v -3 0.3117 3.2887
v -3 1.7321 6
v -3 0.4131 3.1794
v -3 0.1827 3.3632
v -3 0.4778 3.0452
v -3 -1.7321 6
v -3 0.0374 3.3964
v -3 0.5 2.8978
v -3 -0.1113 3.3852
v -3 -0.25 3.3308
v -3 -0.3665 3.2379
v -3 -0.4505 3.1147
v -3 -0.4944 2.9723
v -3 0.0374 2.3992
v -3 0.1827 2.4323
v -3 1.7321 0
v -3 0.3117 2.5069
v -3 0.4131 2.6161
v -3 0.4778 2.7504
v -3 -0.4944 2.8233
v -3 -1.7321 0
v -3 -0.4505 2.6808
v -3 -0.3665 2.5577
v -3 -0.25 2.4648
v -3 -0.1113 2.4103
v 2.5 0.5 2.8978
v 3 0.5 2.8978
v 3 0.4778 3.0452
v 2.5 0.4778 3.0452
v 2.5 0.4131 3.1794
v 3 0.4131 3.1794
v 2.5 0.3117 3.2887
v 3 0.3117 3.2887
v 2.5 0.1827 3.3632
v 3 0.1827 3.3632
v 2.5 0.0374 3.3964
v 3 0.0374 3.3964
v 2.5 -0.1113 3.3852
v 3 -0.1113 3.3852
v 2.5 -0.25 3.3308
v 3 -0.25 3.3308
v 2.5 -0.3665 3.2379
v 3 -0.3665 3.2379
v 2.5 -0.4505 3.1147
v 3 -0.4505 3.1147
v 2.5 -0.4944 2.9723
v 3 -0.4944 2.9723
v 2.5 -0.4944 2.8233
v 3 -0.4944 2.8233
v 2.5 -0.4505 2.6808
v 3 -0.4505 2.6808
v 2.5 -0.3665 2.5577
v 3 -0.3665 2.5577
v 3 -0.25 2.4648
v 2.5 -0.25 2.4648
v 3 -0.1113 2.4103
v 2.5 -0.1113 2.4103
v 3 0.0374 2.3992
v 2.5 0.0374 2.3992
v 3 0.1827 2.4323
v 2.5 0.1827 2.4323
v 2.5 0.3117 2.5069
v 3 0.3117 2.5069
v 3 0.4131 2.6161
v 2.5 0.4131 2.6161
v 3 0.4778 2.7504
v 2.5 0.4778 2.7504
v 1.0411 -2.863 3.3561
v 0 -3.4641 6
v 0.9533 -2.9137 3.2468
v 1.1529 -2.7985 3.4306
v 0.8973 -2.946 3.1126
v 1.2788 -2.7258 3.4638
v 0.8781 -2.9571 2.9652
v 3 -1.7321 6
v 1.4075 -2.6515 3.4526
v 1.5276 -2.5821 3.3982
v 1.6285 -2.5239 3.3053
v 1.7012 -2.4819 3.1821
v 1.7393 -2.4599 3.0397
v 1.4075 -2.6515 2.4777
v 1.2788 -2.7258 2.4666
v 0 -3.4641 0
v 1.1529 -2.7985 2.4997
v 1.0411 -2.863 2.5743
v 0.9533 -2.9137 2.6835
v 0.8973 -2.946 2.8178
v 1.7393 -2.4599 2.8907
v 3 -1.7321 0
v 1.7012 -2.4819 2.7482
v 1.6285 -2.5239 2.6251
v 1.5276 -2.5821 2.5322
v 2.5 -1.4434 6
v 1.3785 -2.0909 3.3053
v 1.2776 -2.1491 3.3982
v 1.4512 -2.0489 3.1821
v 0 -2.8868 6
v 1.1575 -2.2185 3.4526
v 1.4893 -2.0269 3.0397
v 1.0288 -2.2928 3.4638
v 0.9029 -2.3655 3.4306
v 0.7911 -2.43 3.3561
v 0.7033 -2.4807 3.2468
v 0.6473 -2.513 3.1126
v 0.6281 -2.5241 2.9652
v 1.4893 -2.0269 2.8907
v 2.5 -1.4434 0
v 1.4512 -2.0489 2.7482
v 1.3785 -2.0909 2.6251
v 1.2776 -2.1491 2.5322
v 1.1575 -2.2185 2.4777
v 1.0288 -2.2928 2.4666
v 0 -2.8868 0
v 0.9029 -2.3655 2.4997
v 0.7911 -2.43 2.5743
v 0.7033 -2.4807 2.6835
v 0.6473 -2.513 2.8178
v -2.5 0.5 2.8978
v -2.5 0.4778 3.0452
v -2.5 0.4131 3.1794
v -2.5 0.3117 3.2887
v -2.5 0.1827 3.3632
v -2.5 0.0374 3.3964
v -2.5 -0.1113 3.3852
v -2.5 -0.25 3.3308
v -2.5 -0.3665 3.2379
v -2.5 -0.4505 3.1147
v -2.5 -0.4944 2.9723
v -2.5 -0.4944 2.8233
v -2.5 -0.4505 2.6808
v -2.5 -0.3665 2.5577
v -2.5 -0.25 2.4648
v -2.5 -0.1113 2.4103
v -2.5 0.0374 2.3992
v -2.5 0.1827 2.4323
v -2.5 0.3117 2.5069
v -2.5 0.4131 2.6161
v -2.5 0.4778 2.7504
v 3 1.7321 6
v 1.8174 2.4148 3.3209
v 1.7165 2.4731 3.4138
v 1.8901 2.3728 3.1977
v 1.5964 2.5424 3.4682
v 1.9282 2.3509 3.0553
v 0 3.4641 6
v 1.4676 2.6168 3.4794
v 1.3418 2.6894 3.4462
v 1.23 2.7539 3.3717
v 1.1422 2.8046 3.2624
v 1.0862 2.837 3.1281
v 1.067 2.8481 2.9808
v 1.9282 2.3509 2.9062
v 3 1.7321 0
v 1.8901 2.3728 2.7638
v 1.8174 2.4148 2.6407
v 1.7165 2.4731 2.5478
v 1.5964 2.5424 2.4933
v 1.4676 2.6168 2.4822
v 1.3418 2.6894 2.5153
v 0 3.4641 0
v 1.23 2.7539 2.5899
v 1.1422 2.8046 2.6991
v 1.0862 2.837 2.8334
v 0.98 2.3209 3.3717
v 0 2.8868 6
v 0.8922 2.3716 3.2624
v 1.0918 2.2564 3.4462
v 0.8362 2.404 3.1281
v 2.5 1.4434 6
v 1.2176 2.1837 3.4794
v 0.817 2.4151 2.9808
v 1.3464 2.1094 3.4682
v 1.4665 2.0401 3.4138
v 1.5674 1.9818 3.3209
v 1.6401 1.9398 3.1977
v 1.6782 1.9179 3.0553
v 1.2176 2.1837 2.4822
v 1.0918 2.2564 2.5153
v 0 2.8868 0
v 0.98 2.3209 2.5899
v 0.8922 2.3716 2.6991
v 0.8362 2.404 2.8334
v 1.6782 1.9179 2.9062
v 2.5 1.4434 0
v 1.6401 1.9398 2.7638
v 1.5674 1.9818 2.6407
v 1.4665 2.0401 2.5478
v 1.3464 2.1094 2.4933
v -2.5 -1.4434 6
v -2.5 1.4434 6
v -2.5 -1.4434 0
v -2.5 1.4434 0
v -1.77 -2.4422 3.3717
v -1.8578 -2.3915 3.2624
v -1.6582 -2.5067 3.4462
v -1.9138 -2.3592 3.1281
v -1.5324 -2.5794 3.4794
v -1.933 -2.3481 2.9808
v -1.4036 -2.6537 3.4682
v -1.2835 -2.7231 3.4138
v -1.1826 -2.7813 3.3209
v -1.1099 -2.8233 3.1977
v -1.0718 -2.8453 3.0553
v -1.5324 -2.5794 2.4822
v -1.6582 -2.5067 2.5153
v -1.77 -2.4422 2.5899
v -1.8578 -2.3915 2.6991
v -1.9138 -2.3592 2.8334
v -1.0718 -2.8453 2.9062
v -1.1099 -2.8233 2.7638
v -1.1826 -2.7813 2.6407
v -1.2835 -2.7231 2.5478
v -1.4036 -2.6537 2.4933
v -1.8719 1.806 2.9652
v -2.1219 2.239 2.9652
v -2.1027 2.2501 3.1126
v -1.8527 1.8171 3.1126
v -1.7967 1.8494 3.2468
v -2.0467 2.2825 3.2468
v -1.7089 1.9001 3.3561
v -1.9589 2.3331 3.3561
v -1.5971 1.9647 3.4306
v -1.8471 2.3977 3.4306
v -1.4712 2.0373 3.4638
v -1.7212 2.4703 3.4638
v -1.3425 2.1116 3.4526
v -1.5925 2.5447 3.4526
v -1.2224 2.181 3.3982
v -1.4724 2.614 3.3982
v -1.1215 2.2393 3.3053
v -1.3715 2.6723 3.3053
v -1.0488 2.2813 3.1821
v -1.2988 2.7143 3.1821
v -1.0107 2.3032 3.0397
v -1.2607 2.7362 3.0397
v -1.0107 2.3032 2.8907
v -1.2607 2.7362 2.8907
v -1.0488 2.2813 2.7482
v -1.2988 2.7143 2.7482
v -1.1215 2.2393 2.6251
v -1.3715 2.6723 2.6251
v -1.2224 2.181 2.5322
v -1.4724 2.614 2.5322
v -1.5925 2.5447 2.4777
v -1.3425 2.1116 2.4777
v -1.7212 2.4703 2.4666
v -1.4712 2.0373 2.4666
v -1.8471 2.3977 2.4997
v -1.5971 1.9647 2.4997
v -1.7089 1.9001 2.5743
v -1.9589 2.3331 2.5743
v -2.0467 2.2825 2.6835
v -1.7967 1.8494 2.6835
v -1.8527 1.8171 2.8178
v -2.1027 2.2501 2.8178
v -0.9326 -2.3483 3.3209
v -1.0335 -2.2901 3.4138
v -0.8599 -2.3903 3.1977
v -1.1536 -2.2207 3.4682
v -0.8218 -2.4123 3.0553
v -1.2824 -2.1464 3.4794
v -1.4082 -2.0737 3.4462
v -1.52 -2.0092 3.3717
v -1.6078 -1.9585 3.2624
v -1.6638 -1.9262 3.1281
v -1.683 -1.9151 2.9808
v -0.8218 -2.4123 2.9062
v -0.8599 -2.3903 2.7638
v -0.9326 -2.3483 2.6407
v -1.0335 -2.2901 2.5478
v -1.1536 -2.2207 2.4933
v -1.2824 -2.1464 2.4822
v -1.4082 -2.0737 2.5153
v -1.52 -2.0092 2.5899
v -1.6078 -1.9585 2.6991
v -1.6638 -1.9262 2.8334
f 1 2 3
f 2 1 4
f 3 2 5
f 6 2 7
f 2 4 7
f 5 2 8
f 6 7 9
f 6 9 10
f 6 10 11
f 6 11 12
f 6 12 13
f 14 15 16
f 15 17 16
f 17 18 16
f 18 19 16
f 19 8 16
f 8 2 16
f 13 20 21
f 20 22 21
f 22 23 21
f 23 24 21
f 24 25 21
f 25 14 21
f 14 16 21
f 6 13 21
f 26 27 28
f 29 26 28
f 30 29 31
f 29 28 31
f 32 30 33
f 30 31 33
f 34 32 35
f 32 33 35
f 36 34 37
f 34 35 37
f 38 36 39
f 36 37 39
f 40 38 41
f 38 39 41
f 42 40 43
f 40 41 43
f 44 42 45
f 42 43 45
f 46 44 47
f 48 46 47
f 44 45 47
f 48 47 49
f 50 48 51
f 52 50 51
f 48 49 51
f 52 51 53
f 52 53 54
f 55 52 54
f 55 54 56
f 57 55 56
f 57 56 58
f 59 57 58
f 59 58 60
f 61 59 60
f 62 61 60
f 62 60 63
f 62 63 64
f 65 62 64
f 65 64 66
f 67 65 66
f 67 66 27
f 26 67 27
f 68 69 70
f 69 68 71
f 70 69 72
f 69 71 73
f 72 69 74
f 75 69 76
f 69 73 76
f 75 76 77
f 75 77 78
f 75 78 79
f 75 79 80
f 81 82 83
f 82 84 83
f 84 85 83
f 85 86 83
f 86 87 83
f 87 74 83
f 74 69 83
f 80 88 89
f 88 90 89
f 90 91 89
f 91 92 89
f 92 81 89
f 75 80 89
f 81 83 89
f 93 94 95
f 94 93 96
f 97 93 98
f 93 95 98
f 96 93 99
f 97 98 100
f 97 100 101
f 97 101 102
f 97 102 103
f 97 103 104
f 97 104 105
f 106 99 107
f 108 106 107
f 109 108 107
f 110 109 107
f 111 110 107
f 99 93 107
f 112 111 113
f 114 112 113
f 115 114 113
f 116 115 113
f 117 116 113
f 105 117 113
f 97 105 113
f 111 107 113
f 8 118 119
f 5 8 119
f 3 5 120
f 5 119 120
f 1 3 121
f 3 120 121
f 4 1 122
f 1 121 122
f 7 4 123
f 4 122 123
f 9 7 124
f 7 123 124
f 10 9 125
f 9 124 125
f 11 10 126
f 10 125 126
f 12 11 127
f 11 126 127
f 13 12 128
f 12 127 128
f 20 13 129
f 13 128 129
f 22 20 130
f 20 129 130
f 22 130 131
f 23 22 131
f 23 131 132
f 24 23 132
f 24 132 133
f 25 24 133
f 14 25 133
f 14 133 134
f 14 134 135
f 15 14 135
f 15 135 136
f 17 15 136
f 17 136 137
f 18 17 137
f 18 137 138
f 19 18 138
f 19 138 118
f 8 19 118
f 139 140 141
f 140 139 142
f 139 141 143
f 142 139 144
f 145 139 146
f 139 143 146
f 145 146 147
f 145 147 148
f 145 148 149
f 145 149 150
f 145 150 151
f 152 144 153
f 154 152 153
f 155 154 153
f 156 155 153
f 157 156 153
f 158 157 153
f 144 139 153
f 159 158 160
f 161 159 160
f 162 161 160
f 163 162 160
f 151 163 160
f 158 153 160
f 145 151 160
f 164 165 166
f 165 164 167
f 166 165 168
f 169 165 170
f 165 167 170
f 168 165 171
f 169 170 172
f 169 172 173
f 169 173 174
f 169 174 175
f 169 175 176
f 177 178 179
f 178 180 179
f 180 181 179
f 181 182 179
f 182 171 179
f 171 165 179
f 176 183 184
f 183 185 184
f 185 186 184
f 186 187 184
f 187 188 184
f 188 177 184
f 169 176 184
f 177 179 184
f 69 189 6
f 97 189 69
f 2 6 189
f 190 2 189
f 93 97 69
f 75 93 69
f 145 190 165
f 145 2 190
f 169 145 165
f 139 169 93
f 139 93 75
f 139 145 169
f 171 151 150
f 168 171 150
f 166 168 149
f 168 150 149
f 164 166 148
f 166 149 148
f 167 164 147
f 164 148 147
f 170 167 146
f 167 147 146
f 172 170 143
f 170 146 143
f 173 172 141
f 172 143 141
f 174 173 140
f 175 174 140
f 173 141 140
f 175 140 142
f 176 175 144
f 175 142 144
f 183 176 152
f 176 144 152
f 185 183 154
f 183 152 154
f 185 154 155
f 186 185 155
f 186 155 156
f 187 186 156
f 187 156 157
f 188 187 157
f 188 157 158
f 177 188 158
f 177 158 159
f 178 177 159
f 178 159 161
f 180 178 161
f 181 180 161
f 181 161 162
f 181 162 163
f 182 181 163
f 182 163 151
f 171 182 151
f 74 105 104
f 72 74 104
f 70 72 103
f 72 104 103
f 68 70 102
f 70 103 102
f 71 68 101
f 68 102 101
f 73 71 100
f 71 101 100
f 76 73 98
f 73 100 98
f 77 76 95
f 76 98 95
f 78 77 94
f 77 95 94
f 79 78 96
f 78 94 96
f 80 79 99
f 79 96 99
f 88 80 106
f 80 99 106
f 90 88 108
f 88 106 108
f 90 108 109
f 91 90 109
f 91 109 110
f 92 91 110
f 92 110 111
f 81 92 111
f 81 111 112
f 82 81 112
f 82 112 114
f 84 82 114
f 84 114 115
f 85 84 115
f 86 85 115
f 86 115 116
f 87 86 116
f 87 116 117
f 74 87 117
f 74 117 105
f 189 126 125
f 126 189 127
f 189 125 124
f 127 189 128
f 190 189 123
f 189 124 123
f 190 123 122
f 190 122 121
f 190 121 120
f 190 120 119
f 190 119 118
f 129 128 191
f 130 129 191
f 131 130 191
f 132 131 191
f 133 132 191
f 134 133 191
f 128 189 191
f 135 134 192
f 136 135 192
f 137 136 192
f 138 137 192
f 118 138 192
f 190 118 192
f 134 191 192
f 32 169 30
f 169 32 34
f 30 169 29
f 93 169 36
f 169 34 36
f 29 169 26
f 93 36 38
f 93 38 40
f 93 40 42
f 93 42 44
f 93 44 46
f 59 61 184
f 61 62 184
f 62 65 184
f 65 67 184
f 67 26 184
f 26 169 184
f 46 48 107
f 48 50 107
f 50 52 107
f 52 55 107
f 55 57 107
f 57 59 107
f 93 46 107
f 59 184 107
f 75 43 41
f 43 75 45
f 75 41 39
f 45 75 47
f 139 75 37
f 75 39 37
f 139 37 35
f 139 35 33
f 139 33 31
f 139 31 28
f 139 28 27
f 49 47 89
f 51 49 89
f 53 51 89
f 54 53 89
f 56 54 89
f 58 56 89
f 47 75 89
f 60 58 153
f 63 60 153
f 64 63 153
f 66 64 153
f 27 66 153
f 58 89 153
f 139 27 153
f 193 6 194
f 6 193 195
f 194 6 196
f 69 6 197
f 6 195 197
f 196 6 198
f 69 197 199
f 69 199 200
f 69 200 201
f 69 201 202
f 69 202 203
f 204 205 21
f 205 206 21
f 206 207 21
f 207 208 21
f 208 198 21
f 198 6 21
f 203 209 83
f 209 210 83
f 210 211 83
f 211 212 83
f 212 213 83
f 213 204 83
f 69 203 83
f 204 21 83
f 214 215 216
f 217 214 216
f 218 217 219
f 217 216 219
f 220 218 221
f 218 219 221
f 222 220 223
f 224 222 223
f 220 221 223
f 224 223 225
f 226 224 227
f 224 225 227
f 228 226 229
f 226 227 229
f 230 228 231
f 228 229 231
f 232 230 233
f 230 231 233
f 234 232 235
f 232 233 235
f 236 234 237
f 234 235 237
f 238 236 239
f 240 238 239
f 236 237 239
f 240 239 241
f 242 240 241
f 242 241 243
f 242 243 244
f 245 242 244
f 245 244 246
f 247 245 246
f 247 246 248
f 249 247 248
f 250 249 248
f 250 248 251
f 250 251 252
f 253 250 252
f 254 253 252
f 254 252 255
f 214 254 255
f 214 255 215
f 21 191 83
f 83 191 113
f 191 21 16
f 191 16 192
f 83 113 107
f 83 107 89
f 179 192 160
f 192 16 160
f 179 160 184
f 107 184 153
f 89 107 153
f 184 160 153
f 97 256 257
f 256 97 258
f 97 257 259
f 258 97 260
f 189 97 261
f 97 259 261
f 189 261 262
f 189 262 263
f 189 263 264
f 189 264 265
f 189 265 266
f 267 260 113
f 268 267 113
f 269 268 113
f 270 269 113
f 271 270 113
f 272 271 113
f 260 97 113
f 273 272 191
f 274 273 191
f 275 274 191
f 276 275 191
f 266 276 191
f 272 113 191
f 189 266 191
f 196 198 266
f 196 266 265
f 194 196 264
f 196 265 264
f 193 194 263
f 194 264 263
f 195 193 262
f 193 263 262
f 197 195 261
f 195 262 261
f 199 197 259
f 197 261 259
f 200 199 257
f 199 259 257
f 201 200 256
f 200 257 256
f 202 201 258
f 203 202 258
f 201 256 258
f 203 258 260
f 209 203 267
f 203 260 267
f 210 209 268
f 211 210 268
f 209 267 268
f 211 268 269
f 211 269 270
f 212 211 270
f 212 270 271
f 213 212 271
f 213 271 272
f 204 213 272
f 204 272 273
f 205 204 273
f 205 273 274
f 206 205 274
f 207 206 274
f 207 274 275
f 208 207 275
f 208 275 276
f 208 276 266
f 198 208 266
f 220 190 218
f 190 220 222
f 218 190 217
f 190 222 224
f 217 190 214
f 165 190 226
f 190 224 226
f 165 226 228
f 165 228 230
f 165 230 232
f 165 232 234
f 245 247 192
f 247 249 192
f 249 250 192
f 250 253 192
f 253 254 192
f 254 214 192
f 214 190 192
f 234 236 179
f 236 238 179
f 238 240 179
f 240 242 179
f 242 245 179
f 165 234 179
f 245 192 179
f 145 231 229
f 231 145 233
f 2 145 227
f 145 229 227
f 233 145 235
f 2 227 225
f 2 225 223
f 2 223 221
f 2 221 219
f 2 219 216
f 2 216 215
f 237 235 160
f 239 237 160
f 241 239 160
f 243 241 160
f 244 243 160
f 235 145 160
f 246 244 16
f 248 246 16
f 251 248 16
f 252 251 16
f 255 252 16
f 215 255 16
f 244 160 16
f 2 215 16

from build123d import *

# Parameters (mm, degrees)
F1_DEPTH = 6
F2_R     = 0.5
F3_DEPTH = 10
F4_R     = 0.5
F5_DEPTH = 10
F6_R     = 0.5
F7_DEPTH = 10


with BuildPart() as f1:
    # F0 (on Top) → F1 (new body)
    with BuildSketch(Plane.XY):
        Polygon((-3, 1.7320508076), (-3, -1.7320508076), (0, -3.4641016151), (3, -1.7320508076), (3, 1.7320508076), (0, 3.4641016151), align=None)
        Polygon((0, -2.8867513459), (-2.5, -1.443375673), (-2.5, 1.443375673), (0, 2.8867513459), (2.5, 1.443375673), (2.5, -1.443375673), align=None, mode=Mode.SUBTRACT)
    extrude(amount=F1_DEPTH)

    # F2 (on face) → F3 (cut)
    with BuildSketch(Plane.YZ.offset(3)):
        with Locations((0, 2.8977813589)):
            Circle(F2_R)
    extrude(amount=-F3_DEPTH, mode=Mode.SUBTRACT)

    # F4 (on face) → F5 (cut)
    with BuildSketch(Plane(origin=(1.5, 2.5980762114, 0), x_dir=(-0.8660254038, 0.5, 0), z_dir=(0.5, 0.8660254038, 0))):
        with Locations((0, 2.9807699823)):
            Circle(F4_R)
    extrude(amount=-F5_DEPTH, mode=Mode.SUBTRACT)

    # F6 (on face) → F7 (cut)
    with BuildSketch(Plane(origin=(-1.5, 2.5980762114, 0), x_dir=(-0.8660254038, -0.5, 0), z_dir=(-0.5, 0.8660254038, 0))):
        with Locations((0.2181102464, 2.9651848599)):
            Circle(F6_R)
    extrude(amount=-F7_DEPTH, mode=Mode.SUBTRACT)


solid = f1.part
